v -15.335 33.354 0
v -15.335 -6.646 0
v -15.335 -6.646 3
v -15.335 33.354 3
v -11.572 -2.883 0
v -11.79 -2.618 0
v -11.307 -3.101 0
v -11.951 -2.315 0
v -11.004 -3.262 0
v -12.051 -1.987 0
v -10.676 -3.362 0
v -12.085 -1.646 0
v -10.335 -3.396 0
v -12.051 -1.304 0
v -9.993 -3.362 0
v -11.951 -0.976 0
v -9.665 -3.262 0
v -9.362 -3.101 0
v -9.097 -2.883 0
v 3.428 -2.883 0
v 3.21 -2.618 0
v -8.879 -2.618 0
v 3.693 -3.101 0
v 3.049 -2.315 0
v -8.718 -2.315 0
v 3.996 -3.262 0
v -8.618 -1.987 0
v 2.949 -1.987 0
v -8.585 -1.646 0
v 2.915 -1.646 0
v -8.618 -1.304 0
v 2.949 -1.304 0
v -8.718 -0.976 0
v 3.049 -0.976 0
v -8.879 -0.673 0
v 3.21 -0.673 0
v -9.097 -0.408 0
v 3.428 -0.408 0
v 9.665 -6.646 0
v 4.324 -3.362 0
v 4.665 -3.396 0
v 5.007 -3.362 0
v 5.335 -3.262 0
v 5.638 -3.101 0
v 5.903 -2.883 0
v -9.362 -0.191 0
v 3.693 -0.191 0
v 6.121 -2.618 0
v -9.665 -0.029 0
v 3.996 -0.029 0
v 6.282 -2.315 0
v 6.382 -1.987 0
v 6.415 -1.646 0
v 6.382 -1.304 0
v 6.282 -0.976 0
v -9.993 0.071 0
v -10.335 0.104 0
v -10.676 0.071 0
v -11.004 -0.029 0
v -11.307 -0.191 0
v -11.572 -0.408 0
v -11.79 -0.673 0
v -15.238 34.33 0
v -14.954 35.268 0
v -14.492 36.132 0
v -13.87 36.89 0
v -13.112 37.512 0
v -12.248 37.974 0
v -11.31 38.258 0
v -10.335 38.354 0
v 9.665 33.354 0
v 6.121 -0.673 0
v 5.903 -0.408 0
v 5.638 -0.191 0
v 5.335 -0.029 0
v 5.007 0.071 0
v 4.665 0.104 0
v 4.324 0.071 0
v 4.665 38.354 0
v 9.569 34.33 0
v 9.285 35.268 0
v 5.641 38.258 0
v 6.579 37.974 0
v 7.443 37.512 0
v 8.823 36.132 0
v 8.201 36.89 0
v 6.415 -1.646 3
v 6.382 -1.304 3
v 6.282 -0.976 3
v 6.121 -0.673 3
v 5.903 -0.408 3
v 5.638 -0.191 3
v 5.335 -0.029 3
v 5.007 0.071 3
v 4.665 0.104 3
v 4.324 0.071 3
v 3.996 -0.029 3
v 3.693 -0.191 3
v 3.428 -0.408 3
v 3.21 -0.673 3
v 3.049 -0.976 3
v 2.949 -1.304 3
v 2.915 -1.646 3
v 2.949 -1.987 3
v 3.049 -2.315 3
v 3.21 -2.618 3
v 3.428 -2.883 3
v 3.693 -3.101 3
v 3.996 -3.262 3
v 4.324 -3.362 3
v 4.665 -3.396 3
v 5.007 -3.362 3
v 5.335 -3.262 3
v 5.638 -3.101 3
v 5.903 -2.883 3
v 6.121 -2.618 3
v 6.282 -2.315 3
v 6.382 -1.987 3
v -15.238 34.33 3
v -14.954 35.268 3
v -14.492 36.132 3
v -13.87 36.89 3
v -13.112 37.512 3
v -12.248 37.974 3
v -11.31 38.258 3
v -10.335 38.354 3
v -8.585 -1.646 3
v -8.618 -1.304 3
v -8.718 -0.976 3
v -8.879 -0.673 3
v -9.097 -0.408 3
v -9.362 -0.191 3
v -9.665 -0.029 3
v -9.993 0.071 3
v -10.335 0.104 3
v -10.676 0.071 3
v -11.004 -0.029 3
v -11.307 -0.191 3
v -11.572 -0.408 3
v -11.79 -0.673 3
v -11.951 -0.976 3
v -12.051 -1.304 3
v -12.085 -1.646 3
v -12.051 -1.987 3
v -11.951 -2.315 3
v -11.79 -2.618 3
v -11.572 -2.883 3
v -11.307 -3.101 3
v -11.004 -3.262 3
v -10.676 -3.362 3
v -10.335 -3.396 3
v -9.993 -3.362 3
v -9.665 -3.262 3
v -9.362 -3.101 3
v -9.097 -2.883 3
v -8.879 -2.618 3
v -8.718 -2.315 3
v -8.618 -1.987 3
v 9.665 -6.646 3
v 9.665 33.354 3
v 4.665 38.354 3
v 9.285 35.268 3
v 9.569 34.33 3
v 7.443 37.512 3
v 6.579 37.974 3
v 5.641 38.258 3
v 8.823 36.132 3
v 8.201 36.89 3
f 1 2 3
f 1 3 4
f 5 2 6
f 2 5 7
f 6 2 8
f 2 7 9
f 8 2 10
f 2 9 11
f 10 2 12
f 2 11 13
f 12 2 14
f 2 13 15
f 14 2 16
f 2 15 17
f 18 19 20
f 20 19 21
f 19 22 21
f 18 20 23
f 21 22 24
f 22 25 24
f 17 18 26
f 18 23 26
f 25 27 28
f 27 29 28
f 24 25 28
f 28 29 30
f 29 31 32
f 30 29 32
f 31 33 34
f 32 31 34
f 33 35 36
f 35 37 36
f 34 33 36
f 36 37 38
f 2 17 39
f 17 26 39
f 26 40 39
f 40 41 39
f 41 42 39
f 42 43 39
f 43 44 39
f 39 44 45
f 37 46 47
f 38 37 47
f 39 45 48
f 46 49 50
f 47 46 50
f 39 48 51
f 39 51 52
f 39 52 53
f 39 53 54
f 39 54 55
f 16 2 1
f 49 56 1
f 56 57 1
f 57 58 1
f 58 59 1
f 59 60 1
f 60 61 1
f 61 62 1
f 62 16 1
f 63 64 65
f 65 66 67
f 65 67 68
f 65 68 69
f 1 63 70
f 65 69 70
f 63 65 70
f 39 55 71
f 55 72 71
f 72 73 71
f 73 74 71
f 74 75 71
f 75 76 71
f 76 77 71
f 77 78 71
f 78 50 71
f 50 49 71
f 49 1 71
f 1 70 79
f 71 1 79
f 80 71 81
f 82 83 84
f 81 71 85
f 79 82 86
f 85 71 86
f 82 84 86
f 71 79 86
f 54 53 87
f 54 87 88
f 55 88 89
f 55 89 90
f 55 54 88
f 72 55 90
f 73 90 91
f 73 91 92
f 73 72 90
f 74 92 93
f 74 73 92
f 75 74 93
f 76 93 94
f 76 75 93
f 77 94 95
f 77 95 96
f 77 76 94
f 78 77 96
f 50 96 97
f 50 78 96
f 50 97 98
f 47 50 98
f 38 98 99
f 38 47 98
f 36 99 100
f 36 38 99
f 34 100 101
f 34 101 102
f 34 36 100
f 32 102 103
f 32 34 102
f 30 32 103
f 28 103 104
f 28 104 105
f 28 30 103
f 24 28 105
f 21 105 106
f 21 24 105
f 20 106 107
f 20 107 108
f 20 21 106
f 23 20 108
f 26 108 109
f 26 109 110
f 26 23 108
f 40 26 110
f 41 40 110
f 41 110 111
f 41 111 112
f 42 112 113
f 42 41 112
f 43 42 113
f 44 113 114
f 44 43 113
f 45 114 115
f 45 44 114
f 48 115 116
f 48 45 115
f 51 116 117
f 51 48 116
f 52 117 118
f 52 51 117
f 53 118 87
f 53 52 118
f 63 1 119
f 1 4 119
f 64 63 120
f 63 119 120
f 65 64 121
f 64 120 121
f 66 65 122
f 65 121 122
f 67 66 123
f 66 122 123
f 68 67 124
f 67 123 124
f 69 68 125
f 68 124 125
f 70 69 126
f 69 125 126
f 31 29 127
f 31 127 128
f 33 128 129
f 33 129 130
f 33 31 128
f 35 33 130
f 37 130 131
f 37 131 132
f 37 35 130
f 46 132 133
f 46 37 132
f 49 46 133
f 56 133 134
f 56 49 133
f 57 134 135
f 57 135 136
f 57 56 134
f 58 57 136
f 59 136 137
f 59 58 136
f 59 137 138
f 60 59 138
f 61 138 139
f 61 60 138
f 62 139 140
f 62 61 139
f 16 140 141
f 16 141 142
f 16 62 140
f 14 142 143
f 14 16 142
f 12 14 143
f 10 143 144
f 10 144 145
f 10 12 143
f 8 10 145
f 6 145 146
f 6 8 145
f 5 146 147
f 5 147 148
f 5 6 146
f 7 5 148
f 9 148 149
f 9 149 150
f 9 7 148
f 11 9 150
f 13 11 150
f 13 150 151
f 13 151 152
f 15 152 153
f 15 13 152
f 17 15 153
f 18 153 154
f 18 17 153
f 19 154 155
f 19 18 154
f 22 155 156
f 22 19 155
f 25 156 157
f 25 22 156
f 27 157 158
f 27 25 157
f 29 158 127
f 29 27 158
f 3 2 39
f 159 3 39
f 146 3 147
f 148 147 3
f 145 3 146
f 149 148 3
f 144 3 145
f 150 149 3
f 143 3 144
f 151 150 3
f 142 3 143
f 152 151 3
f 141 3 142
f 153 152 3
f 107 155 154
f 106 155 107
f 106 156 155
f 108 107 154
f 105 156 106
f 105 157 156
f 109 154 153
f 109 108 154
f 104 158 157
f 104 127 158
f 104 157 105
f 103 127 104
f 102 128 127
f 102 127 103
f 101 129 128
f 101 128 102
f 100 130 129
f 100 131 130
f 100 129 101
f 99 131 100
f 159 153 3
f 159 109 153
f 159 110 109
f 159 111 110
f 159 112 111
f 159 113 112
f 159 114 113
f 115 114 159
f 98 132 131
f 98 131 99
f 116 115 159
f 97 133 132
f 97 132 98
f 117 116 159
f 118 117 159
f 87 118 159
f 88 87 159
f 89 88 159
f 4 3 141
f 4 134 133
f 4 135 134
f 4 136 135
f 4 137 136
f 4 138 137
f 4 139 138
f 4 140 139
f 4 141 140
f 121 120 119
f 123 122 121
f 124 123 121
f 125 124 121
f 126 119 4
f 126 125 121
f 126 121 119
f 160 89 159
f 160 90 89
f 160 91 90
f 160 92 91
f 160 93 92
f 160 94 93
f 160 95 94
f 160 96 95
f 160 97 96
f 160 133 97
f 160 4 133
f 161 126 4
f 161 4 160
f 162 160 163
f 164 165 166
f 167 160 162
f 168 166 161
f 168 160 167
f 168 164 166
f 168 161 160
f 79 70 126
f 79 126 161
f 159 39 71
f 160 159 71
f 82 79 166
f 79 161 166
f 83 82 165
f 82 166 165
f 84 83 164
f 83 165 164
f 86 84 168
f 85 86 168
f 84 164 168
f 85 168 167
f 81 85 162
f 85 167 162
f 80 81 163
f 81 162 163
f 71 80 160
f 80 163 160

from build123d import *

# Parameters (mm, degrees)
F0_W     = 25
F0_H     = 45
F0_R     = 1.75
F1_DEPTH = 3
F2_R     = 5


with BuildPart() as f1:
    # F0 (on Top) → F1 (new body)
    with BuildSketch(Plane.XY):
        with Locations((-2.834506, 15.854306)):
            Rectangle(F0_W, F0_H)
        with Locations((-10.334506, -1.645694)):
            Circle(F0_R, mode=Mode.SUBTRACT)
        with Locations((4.665494, -1.645694)):
            Circle(F0_R, mode=Mode.SUBTRACT)
    extrude(amount=F1_DEPTH)

    # F2
    f2_edges = [f1.edges().sort_by_distance(p)[0] for p in [
        (9.665494, 38.354306, 1.5),
        (-15.334506, 38.354306, 1.5),
    ]]
    fillet(f2_edges, radius=F2_R)


solid = f1.part
